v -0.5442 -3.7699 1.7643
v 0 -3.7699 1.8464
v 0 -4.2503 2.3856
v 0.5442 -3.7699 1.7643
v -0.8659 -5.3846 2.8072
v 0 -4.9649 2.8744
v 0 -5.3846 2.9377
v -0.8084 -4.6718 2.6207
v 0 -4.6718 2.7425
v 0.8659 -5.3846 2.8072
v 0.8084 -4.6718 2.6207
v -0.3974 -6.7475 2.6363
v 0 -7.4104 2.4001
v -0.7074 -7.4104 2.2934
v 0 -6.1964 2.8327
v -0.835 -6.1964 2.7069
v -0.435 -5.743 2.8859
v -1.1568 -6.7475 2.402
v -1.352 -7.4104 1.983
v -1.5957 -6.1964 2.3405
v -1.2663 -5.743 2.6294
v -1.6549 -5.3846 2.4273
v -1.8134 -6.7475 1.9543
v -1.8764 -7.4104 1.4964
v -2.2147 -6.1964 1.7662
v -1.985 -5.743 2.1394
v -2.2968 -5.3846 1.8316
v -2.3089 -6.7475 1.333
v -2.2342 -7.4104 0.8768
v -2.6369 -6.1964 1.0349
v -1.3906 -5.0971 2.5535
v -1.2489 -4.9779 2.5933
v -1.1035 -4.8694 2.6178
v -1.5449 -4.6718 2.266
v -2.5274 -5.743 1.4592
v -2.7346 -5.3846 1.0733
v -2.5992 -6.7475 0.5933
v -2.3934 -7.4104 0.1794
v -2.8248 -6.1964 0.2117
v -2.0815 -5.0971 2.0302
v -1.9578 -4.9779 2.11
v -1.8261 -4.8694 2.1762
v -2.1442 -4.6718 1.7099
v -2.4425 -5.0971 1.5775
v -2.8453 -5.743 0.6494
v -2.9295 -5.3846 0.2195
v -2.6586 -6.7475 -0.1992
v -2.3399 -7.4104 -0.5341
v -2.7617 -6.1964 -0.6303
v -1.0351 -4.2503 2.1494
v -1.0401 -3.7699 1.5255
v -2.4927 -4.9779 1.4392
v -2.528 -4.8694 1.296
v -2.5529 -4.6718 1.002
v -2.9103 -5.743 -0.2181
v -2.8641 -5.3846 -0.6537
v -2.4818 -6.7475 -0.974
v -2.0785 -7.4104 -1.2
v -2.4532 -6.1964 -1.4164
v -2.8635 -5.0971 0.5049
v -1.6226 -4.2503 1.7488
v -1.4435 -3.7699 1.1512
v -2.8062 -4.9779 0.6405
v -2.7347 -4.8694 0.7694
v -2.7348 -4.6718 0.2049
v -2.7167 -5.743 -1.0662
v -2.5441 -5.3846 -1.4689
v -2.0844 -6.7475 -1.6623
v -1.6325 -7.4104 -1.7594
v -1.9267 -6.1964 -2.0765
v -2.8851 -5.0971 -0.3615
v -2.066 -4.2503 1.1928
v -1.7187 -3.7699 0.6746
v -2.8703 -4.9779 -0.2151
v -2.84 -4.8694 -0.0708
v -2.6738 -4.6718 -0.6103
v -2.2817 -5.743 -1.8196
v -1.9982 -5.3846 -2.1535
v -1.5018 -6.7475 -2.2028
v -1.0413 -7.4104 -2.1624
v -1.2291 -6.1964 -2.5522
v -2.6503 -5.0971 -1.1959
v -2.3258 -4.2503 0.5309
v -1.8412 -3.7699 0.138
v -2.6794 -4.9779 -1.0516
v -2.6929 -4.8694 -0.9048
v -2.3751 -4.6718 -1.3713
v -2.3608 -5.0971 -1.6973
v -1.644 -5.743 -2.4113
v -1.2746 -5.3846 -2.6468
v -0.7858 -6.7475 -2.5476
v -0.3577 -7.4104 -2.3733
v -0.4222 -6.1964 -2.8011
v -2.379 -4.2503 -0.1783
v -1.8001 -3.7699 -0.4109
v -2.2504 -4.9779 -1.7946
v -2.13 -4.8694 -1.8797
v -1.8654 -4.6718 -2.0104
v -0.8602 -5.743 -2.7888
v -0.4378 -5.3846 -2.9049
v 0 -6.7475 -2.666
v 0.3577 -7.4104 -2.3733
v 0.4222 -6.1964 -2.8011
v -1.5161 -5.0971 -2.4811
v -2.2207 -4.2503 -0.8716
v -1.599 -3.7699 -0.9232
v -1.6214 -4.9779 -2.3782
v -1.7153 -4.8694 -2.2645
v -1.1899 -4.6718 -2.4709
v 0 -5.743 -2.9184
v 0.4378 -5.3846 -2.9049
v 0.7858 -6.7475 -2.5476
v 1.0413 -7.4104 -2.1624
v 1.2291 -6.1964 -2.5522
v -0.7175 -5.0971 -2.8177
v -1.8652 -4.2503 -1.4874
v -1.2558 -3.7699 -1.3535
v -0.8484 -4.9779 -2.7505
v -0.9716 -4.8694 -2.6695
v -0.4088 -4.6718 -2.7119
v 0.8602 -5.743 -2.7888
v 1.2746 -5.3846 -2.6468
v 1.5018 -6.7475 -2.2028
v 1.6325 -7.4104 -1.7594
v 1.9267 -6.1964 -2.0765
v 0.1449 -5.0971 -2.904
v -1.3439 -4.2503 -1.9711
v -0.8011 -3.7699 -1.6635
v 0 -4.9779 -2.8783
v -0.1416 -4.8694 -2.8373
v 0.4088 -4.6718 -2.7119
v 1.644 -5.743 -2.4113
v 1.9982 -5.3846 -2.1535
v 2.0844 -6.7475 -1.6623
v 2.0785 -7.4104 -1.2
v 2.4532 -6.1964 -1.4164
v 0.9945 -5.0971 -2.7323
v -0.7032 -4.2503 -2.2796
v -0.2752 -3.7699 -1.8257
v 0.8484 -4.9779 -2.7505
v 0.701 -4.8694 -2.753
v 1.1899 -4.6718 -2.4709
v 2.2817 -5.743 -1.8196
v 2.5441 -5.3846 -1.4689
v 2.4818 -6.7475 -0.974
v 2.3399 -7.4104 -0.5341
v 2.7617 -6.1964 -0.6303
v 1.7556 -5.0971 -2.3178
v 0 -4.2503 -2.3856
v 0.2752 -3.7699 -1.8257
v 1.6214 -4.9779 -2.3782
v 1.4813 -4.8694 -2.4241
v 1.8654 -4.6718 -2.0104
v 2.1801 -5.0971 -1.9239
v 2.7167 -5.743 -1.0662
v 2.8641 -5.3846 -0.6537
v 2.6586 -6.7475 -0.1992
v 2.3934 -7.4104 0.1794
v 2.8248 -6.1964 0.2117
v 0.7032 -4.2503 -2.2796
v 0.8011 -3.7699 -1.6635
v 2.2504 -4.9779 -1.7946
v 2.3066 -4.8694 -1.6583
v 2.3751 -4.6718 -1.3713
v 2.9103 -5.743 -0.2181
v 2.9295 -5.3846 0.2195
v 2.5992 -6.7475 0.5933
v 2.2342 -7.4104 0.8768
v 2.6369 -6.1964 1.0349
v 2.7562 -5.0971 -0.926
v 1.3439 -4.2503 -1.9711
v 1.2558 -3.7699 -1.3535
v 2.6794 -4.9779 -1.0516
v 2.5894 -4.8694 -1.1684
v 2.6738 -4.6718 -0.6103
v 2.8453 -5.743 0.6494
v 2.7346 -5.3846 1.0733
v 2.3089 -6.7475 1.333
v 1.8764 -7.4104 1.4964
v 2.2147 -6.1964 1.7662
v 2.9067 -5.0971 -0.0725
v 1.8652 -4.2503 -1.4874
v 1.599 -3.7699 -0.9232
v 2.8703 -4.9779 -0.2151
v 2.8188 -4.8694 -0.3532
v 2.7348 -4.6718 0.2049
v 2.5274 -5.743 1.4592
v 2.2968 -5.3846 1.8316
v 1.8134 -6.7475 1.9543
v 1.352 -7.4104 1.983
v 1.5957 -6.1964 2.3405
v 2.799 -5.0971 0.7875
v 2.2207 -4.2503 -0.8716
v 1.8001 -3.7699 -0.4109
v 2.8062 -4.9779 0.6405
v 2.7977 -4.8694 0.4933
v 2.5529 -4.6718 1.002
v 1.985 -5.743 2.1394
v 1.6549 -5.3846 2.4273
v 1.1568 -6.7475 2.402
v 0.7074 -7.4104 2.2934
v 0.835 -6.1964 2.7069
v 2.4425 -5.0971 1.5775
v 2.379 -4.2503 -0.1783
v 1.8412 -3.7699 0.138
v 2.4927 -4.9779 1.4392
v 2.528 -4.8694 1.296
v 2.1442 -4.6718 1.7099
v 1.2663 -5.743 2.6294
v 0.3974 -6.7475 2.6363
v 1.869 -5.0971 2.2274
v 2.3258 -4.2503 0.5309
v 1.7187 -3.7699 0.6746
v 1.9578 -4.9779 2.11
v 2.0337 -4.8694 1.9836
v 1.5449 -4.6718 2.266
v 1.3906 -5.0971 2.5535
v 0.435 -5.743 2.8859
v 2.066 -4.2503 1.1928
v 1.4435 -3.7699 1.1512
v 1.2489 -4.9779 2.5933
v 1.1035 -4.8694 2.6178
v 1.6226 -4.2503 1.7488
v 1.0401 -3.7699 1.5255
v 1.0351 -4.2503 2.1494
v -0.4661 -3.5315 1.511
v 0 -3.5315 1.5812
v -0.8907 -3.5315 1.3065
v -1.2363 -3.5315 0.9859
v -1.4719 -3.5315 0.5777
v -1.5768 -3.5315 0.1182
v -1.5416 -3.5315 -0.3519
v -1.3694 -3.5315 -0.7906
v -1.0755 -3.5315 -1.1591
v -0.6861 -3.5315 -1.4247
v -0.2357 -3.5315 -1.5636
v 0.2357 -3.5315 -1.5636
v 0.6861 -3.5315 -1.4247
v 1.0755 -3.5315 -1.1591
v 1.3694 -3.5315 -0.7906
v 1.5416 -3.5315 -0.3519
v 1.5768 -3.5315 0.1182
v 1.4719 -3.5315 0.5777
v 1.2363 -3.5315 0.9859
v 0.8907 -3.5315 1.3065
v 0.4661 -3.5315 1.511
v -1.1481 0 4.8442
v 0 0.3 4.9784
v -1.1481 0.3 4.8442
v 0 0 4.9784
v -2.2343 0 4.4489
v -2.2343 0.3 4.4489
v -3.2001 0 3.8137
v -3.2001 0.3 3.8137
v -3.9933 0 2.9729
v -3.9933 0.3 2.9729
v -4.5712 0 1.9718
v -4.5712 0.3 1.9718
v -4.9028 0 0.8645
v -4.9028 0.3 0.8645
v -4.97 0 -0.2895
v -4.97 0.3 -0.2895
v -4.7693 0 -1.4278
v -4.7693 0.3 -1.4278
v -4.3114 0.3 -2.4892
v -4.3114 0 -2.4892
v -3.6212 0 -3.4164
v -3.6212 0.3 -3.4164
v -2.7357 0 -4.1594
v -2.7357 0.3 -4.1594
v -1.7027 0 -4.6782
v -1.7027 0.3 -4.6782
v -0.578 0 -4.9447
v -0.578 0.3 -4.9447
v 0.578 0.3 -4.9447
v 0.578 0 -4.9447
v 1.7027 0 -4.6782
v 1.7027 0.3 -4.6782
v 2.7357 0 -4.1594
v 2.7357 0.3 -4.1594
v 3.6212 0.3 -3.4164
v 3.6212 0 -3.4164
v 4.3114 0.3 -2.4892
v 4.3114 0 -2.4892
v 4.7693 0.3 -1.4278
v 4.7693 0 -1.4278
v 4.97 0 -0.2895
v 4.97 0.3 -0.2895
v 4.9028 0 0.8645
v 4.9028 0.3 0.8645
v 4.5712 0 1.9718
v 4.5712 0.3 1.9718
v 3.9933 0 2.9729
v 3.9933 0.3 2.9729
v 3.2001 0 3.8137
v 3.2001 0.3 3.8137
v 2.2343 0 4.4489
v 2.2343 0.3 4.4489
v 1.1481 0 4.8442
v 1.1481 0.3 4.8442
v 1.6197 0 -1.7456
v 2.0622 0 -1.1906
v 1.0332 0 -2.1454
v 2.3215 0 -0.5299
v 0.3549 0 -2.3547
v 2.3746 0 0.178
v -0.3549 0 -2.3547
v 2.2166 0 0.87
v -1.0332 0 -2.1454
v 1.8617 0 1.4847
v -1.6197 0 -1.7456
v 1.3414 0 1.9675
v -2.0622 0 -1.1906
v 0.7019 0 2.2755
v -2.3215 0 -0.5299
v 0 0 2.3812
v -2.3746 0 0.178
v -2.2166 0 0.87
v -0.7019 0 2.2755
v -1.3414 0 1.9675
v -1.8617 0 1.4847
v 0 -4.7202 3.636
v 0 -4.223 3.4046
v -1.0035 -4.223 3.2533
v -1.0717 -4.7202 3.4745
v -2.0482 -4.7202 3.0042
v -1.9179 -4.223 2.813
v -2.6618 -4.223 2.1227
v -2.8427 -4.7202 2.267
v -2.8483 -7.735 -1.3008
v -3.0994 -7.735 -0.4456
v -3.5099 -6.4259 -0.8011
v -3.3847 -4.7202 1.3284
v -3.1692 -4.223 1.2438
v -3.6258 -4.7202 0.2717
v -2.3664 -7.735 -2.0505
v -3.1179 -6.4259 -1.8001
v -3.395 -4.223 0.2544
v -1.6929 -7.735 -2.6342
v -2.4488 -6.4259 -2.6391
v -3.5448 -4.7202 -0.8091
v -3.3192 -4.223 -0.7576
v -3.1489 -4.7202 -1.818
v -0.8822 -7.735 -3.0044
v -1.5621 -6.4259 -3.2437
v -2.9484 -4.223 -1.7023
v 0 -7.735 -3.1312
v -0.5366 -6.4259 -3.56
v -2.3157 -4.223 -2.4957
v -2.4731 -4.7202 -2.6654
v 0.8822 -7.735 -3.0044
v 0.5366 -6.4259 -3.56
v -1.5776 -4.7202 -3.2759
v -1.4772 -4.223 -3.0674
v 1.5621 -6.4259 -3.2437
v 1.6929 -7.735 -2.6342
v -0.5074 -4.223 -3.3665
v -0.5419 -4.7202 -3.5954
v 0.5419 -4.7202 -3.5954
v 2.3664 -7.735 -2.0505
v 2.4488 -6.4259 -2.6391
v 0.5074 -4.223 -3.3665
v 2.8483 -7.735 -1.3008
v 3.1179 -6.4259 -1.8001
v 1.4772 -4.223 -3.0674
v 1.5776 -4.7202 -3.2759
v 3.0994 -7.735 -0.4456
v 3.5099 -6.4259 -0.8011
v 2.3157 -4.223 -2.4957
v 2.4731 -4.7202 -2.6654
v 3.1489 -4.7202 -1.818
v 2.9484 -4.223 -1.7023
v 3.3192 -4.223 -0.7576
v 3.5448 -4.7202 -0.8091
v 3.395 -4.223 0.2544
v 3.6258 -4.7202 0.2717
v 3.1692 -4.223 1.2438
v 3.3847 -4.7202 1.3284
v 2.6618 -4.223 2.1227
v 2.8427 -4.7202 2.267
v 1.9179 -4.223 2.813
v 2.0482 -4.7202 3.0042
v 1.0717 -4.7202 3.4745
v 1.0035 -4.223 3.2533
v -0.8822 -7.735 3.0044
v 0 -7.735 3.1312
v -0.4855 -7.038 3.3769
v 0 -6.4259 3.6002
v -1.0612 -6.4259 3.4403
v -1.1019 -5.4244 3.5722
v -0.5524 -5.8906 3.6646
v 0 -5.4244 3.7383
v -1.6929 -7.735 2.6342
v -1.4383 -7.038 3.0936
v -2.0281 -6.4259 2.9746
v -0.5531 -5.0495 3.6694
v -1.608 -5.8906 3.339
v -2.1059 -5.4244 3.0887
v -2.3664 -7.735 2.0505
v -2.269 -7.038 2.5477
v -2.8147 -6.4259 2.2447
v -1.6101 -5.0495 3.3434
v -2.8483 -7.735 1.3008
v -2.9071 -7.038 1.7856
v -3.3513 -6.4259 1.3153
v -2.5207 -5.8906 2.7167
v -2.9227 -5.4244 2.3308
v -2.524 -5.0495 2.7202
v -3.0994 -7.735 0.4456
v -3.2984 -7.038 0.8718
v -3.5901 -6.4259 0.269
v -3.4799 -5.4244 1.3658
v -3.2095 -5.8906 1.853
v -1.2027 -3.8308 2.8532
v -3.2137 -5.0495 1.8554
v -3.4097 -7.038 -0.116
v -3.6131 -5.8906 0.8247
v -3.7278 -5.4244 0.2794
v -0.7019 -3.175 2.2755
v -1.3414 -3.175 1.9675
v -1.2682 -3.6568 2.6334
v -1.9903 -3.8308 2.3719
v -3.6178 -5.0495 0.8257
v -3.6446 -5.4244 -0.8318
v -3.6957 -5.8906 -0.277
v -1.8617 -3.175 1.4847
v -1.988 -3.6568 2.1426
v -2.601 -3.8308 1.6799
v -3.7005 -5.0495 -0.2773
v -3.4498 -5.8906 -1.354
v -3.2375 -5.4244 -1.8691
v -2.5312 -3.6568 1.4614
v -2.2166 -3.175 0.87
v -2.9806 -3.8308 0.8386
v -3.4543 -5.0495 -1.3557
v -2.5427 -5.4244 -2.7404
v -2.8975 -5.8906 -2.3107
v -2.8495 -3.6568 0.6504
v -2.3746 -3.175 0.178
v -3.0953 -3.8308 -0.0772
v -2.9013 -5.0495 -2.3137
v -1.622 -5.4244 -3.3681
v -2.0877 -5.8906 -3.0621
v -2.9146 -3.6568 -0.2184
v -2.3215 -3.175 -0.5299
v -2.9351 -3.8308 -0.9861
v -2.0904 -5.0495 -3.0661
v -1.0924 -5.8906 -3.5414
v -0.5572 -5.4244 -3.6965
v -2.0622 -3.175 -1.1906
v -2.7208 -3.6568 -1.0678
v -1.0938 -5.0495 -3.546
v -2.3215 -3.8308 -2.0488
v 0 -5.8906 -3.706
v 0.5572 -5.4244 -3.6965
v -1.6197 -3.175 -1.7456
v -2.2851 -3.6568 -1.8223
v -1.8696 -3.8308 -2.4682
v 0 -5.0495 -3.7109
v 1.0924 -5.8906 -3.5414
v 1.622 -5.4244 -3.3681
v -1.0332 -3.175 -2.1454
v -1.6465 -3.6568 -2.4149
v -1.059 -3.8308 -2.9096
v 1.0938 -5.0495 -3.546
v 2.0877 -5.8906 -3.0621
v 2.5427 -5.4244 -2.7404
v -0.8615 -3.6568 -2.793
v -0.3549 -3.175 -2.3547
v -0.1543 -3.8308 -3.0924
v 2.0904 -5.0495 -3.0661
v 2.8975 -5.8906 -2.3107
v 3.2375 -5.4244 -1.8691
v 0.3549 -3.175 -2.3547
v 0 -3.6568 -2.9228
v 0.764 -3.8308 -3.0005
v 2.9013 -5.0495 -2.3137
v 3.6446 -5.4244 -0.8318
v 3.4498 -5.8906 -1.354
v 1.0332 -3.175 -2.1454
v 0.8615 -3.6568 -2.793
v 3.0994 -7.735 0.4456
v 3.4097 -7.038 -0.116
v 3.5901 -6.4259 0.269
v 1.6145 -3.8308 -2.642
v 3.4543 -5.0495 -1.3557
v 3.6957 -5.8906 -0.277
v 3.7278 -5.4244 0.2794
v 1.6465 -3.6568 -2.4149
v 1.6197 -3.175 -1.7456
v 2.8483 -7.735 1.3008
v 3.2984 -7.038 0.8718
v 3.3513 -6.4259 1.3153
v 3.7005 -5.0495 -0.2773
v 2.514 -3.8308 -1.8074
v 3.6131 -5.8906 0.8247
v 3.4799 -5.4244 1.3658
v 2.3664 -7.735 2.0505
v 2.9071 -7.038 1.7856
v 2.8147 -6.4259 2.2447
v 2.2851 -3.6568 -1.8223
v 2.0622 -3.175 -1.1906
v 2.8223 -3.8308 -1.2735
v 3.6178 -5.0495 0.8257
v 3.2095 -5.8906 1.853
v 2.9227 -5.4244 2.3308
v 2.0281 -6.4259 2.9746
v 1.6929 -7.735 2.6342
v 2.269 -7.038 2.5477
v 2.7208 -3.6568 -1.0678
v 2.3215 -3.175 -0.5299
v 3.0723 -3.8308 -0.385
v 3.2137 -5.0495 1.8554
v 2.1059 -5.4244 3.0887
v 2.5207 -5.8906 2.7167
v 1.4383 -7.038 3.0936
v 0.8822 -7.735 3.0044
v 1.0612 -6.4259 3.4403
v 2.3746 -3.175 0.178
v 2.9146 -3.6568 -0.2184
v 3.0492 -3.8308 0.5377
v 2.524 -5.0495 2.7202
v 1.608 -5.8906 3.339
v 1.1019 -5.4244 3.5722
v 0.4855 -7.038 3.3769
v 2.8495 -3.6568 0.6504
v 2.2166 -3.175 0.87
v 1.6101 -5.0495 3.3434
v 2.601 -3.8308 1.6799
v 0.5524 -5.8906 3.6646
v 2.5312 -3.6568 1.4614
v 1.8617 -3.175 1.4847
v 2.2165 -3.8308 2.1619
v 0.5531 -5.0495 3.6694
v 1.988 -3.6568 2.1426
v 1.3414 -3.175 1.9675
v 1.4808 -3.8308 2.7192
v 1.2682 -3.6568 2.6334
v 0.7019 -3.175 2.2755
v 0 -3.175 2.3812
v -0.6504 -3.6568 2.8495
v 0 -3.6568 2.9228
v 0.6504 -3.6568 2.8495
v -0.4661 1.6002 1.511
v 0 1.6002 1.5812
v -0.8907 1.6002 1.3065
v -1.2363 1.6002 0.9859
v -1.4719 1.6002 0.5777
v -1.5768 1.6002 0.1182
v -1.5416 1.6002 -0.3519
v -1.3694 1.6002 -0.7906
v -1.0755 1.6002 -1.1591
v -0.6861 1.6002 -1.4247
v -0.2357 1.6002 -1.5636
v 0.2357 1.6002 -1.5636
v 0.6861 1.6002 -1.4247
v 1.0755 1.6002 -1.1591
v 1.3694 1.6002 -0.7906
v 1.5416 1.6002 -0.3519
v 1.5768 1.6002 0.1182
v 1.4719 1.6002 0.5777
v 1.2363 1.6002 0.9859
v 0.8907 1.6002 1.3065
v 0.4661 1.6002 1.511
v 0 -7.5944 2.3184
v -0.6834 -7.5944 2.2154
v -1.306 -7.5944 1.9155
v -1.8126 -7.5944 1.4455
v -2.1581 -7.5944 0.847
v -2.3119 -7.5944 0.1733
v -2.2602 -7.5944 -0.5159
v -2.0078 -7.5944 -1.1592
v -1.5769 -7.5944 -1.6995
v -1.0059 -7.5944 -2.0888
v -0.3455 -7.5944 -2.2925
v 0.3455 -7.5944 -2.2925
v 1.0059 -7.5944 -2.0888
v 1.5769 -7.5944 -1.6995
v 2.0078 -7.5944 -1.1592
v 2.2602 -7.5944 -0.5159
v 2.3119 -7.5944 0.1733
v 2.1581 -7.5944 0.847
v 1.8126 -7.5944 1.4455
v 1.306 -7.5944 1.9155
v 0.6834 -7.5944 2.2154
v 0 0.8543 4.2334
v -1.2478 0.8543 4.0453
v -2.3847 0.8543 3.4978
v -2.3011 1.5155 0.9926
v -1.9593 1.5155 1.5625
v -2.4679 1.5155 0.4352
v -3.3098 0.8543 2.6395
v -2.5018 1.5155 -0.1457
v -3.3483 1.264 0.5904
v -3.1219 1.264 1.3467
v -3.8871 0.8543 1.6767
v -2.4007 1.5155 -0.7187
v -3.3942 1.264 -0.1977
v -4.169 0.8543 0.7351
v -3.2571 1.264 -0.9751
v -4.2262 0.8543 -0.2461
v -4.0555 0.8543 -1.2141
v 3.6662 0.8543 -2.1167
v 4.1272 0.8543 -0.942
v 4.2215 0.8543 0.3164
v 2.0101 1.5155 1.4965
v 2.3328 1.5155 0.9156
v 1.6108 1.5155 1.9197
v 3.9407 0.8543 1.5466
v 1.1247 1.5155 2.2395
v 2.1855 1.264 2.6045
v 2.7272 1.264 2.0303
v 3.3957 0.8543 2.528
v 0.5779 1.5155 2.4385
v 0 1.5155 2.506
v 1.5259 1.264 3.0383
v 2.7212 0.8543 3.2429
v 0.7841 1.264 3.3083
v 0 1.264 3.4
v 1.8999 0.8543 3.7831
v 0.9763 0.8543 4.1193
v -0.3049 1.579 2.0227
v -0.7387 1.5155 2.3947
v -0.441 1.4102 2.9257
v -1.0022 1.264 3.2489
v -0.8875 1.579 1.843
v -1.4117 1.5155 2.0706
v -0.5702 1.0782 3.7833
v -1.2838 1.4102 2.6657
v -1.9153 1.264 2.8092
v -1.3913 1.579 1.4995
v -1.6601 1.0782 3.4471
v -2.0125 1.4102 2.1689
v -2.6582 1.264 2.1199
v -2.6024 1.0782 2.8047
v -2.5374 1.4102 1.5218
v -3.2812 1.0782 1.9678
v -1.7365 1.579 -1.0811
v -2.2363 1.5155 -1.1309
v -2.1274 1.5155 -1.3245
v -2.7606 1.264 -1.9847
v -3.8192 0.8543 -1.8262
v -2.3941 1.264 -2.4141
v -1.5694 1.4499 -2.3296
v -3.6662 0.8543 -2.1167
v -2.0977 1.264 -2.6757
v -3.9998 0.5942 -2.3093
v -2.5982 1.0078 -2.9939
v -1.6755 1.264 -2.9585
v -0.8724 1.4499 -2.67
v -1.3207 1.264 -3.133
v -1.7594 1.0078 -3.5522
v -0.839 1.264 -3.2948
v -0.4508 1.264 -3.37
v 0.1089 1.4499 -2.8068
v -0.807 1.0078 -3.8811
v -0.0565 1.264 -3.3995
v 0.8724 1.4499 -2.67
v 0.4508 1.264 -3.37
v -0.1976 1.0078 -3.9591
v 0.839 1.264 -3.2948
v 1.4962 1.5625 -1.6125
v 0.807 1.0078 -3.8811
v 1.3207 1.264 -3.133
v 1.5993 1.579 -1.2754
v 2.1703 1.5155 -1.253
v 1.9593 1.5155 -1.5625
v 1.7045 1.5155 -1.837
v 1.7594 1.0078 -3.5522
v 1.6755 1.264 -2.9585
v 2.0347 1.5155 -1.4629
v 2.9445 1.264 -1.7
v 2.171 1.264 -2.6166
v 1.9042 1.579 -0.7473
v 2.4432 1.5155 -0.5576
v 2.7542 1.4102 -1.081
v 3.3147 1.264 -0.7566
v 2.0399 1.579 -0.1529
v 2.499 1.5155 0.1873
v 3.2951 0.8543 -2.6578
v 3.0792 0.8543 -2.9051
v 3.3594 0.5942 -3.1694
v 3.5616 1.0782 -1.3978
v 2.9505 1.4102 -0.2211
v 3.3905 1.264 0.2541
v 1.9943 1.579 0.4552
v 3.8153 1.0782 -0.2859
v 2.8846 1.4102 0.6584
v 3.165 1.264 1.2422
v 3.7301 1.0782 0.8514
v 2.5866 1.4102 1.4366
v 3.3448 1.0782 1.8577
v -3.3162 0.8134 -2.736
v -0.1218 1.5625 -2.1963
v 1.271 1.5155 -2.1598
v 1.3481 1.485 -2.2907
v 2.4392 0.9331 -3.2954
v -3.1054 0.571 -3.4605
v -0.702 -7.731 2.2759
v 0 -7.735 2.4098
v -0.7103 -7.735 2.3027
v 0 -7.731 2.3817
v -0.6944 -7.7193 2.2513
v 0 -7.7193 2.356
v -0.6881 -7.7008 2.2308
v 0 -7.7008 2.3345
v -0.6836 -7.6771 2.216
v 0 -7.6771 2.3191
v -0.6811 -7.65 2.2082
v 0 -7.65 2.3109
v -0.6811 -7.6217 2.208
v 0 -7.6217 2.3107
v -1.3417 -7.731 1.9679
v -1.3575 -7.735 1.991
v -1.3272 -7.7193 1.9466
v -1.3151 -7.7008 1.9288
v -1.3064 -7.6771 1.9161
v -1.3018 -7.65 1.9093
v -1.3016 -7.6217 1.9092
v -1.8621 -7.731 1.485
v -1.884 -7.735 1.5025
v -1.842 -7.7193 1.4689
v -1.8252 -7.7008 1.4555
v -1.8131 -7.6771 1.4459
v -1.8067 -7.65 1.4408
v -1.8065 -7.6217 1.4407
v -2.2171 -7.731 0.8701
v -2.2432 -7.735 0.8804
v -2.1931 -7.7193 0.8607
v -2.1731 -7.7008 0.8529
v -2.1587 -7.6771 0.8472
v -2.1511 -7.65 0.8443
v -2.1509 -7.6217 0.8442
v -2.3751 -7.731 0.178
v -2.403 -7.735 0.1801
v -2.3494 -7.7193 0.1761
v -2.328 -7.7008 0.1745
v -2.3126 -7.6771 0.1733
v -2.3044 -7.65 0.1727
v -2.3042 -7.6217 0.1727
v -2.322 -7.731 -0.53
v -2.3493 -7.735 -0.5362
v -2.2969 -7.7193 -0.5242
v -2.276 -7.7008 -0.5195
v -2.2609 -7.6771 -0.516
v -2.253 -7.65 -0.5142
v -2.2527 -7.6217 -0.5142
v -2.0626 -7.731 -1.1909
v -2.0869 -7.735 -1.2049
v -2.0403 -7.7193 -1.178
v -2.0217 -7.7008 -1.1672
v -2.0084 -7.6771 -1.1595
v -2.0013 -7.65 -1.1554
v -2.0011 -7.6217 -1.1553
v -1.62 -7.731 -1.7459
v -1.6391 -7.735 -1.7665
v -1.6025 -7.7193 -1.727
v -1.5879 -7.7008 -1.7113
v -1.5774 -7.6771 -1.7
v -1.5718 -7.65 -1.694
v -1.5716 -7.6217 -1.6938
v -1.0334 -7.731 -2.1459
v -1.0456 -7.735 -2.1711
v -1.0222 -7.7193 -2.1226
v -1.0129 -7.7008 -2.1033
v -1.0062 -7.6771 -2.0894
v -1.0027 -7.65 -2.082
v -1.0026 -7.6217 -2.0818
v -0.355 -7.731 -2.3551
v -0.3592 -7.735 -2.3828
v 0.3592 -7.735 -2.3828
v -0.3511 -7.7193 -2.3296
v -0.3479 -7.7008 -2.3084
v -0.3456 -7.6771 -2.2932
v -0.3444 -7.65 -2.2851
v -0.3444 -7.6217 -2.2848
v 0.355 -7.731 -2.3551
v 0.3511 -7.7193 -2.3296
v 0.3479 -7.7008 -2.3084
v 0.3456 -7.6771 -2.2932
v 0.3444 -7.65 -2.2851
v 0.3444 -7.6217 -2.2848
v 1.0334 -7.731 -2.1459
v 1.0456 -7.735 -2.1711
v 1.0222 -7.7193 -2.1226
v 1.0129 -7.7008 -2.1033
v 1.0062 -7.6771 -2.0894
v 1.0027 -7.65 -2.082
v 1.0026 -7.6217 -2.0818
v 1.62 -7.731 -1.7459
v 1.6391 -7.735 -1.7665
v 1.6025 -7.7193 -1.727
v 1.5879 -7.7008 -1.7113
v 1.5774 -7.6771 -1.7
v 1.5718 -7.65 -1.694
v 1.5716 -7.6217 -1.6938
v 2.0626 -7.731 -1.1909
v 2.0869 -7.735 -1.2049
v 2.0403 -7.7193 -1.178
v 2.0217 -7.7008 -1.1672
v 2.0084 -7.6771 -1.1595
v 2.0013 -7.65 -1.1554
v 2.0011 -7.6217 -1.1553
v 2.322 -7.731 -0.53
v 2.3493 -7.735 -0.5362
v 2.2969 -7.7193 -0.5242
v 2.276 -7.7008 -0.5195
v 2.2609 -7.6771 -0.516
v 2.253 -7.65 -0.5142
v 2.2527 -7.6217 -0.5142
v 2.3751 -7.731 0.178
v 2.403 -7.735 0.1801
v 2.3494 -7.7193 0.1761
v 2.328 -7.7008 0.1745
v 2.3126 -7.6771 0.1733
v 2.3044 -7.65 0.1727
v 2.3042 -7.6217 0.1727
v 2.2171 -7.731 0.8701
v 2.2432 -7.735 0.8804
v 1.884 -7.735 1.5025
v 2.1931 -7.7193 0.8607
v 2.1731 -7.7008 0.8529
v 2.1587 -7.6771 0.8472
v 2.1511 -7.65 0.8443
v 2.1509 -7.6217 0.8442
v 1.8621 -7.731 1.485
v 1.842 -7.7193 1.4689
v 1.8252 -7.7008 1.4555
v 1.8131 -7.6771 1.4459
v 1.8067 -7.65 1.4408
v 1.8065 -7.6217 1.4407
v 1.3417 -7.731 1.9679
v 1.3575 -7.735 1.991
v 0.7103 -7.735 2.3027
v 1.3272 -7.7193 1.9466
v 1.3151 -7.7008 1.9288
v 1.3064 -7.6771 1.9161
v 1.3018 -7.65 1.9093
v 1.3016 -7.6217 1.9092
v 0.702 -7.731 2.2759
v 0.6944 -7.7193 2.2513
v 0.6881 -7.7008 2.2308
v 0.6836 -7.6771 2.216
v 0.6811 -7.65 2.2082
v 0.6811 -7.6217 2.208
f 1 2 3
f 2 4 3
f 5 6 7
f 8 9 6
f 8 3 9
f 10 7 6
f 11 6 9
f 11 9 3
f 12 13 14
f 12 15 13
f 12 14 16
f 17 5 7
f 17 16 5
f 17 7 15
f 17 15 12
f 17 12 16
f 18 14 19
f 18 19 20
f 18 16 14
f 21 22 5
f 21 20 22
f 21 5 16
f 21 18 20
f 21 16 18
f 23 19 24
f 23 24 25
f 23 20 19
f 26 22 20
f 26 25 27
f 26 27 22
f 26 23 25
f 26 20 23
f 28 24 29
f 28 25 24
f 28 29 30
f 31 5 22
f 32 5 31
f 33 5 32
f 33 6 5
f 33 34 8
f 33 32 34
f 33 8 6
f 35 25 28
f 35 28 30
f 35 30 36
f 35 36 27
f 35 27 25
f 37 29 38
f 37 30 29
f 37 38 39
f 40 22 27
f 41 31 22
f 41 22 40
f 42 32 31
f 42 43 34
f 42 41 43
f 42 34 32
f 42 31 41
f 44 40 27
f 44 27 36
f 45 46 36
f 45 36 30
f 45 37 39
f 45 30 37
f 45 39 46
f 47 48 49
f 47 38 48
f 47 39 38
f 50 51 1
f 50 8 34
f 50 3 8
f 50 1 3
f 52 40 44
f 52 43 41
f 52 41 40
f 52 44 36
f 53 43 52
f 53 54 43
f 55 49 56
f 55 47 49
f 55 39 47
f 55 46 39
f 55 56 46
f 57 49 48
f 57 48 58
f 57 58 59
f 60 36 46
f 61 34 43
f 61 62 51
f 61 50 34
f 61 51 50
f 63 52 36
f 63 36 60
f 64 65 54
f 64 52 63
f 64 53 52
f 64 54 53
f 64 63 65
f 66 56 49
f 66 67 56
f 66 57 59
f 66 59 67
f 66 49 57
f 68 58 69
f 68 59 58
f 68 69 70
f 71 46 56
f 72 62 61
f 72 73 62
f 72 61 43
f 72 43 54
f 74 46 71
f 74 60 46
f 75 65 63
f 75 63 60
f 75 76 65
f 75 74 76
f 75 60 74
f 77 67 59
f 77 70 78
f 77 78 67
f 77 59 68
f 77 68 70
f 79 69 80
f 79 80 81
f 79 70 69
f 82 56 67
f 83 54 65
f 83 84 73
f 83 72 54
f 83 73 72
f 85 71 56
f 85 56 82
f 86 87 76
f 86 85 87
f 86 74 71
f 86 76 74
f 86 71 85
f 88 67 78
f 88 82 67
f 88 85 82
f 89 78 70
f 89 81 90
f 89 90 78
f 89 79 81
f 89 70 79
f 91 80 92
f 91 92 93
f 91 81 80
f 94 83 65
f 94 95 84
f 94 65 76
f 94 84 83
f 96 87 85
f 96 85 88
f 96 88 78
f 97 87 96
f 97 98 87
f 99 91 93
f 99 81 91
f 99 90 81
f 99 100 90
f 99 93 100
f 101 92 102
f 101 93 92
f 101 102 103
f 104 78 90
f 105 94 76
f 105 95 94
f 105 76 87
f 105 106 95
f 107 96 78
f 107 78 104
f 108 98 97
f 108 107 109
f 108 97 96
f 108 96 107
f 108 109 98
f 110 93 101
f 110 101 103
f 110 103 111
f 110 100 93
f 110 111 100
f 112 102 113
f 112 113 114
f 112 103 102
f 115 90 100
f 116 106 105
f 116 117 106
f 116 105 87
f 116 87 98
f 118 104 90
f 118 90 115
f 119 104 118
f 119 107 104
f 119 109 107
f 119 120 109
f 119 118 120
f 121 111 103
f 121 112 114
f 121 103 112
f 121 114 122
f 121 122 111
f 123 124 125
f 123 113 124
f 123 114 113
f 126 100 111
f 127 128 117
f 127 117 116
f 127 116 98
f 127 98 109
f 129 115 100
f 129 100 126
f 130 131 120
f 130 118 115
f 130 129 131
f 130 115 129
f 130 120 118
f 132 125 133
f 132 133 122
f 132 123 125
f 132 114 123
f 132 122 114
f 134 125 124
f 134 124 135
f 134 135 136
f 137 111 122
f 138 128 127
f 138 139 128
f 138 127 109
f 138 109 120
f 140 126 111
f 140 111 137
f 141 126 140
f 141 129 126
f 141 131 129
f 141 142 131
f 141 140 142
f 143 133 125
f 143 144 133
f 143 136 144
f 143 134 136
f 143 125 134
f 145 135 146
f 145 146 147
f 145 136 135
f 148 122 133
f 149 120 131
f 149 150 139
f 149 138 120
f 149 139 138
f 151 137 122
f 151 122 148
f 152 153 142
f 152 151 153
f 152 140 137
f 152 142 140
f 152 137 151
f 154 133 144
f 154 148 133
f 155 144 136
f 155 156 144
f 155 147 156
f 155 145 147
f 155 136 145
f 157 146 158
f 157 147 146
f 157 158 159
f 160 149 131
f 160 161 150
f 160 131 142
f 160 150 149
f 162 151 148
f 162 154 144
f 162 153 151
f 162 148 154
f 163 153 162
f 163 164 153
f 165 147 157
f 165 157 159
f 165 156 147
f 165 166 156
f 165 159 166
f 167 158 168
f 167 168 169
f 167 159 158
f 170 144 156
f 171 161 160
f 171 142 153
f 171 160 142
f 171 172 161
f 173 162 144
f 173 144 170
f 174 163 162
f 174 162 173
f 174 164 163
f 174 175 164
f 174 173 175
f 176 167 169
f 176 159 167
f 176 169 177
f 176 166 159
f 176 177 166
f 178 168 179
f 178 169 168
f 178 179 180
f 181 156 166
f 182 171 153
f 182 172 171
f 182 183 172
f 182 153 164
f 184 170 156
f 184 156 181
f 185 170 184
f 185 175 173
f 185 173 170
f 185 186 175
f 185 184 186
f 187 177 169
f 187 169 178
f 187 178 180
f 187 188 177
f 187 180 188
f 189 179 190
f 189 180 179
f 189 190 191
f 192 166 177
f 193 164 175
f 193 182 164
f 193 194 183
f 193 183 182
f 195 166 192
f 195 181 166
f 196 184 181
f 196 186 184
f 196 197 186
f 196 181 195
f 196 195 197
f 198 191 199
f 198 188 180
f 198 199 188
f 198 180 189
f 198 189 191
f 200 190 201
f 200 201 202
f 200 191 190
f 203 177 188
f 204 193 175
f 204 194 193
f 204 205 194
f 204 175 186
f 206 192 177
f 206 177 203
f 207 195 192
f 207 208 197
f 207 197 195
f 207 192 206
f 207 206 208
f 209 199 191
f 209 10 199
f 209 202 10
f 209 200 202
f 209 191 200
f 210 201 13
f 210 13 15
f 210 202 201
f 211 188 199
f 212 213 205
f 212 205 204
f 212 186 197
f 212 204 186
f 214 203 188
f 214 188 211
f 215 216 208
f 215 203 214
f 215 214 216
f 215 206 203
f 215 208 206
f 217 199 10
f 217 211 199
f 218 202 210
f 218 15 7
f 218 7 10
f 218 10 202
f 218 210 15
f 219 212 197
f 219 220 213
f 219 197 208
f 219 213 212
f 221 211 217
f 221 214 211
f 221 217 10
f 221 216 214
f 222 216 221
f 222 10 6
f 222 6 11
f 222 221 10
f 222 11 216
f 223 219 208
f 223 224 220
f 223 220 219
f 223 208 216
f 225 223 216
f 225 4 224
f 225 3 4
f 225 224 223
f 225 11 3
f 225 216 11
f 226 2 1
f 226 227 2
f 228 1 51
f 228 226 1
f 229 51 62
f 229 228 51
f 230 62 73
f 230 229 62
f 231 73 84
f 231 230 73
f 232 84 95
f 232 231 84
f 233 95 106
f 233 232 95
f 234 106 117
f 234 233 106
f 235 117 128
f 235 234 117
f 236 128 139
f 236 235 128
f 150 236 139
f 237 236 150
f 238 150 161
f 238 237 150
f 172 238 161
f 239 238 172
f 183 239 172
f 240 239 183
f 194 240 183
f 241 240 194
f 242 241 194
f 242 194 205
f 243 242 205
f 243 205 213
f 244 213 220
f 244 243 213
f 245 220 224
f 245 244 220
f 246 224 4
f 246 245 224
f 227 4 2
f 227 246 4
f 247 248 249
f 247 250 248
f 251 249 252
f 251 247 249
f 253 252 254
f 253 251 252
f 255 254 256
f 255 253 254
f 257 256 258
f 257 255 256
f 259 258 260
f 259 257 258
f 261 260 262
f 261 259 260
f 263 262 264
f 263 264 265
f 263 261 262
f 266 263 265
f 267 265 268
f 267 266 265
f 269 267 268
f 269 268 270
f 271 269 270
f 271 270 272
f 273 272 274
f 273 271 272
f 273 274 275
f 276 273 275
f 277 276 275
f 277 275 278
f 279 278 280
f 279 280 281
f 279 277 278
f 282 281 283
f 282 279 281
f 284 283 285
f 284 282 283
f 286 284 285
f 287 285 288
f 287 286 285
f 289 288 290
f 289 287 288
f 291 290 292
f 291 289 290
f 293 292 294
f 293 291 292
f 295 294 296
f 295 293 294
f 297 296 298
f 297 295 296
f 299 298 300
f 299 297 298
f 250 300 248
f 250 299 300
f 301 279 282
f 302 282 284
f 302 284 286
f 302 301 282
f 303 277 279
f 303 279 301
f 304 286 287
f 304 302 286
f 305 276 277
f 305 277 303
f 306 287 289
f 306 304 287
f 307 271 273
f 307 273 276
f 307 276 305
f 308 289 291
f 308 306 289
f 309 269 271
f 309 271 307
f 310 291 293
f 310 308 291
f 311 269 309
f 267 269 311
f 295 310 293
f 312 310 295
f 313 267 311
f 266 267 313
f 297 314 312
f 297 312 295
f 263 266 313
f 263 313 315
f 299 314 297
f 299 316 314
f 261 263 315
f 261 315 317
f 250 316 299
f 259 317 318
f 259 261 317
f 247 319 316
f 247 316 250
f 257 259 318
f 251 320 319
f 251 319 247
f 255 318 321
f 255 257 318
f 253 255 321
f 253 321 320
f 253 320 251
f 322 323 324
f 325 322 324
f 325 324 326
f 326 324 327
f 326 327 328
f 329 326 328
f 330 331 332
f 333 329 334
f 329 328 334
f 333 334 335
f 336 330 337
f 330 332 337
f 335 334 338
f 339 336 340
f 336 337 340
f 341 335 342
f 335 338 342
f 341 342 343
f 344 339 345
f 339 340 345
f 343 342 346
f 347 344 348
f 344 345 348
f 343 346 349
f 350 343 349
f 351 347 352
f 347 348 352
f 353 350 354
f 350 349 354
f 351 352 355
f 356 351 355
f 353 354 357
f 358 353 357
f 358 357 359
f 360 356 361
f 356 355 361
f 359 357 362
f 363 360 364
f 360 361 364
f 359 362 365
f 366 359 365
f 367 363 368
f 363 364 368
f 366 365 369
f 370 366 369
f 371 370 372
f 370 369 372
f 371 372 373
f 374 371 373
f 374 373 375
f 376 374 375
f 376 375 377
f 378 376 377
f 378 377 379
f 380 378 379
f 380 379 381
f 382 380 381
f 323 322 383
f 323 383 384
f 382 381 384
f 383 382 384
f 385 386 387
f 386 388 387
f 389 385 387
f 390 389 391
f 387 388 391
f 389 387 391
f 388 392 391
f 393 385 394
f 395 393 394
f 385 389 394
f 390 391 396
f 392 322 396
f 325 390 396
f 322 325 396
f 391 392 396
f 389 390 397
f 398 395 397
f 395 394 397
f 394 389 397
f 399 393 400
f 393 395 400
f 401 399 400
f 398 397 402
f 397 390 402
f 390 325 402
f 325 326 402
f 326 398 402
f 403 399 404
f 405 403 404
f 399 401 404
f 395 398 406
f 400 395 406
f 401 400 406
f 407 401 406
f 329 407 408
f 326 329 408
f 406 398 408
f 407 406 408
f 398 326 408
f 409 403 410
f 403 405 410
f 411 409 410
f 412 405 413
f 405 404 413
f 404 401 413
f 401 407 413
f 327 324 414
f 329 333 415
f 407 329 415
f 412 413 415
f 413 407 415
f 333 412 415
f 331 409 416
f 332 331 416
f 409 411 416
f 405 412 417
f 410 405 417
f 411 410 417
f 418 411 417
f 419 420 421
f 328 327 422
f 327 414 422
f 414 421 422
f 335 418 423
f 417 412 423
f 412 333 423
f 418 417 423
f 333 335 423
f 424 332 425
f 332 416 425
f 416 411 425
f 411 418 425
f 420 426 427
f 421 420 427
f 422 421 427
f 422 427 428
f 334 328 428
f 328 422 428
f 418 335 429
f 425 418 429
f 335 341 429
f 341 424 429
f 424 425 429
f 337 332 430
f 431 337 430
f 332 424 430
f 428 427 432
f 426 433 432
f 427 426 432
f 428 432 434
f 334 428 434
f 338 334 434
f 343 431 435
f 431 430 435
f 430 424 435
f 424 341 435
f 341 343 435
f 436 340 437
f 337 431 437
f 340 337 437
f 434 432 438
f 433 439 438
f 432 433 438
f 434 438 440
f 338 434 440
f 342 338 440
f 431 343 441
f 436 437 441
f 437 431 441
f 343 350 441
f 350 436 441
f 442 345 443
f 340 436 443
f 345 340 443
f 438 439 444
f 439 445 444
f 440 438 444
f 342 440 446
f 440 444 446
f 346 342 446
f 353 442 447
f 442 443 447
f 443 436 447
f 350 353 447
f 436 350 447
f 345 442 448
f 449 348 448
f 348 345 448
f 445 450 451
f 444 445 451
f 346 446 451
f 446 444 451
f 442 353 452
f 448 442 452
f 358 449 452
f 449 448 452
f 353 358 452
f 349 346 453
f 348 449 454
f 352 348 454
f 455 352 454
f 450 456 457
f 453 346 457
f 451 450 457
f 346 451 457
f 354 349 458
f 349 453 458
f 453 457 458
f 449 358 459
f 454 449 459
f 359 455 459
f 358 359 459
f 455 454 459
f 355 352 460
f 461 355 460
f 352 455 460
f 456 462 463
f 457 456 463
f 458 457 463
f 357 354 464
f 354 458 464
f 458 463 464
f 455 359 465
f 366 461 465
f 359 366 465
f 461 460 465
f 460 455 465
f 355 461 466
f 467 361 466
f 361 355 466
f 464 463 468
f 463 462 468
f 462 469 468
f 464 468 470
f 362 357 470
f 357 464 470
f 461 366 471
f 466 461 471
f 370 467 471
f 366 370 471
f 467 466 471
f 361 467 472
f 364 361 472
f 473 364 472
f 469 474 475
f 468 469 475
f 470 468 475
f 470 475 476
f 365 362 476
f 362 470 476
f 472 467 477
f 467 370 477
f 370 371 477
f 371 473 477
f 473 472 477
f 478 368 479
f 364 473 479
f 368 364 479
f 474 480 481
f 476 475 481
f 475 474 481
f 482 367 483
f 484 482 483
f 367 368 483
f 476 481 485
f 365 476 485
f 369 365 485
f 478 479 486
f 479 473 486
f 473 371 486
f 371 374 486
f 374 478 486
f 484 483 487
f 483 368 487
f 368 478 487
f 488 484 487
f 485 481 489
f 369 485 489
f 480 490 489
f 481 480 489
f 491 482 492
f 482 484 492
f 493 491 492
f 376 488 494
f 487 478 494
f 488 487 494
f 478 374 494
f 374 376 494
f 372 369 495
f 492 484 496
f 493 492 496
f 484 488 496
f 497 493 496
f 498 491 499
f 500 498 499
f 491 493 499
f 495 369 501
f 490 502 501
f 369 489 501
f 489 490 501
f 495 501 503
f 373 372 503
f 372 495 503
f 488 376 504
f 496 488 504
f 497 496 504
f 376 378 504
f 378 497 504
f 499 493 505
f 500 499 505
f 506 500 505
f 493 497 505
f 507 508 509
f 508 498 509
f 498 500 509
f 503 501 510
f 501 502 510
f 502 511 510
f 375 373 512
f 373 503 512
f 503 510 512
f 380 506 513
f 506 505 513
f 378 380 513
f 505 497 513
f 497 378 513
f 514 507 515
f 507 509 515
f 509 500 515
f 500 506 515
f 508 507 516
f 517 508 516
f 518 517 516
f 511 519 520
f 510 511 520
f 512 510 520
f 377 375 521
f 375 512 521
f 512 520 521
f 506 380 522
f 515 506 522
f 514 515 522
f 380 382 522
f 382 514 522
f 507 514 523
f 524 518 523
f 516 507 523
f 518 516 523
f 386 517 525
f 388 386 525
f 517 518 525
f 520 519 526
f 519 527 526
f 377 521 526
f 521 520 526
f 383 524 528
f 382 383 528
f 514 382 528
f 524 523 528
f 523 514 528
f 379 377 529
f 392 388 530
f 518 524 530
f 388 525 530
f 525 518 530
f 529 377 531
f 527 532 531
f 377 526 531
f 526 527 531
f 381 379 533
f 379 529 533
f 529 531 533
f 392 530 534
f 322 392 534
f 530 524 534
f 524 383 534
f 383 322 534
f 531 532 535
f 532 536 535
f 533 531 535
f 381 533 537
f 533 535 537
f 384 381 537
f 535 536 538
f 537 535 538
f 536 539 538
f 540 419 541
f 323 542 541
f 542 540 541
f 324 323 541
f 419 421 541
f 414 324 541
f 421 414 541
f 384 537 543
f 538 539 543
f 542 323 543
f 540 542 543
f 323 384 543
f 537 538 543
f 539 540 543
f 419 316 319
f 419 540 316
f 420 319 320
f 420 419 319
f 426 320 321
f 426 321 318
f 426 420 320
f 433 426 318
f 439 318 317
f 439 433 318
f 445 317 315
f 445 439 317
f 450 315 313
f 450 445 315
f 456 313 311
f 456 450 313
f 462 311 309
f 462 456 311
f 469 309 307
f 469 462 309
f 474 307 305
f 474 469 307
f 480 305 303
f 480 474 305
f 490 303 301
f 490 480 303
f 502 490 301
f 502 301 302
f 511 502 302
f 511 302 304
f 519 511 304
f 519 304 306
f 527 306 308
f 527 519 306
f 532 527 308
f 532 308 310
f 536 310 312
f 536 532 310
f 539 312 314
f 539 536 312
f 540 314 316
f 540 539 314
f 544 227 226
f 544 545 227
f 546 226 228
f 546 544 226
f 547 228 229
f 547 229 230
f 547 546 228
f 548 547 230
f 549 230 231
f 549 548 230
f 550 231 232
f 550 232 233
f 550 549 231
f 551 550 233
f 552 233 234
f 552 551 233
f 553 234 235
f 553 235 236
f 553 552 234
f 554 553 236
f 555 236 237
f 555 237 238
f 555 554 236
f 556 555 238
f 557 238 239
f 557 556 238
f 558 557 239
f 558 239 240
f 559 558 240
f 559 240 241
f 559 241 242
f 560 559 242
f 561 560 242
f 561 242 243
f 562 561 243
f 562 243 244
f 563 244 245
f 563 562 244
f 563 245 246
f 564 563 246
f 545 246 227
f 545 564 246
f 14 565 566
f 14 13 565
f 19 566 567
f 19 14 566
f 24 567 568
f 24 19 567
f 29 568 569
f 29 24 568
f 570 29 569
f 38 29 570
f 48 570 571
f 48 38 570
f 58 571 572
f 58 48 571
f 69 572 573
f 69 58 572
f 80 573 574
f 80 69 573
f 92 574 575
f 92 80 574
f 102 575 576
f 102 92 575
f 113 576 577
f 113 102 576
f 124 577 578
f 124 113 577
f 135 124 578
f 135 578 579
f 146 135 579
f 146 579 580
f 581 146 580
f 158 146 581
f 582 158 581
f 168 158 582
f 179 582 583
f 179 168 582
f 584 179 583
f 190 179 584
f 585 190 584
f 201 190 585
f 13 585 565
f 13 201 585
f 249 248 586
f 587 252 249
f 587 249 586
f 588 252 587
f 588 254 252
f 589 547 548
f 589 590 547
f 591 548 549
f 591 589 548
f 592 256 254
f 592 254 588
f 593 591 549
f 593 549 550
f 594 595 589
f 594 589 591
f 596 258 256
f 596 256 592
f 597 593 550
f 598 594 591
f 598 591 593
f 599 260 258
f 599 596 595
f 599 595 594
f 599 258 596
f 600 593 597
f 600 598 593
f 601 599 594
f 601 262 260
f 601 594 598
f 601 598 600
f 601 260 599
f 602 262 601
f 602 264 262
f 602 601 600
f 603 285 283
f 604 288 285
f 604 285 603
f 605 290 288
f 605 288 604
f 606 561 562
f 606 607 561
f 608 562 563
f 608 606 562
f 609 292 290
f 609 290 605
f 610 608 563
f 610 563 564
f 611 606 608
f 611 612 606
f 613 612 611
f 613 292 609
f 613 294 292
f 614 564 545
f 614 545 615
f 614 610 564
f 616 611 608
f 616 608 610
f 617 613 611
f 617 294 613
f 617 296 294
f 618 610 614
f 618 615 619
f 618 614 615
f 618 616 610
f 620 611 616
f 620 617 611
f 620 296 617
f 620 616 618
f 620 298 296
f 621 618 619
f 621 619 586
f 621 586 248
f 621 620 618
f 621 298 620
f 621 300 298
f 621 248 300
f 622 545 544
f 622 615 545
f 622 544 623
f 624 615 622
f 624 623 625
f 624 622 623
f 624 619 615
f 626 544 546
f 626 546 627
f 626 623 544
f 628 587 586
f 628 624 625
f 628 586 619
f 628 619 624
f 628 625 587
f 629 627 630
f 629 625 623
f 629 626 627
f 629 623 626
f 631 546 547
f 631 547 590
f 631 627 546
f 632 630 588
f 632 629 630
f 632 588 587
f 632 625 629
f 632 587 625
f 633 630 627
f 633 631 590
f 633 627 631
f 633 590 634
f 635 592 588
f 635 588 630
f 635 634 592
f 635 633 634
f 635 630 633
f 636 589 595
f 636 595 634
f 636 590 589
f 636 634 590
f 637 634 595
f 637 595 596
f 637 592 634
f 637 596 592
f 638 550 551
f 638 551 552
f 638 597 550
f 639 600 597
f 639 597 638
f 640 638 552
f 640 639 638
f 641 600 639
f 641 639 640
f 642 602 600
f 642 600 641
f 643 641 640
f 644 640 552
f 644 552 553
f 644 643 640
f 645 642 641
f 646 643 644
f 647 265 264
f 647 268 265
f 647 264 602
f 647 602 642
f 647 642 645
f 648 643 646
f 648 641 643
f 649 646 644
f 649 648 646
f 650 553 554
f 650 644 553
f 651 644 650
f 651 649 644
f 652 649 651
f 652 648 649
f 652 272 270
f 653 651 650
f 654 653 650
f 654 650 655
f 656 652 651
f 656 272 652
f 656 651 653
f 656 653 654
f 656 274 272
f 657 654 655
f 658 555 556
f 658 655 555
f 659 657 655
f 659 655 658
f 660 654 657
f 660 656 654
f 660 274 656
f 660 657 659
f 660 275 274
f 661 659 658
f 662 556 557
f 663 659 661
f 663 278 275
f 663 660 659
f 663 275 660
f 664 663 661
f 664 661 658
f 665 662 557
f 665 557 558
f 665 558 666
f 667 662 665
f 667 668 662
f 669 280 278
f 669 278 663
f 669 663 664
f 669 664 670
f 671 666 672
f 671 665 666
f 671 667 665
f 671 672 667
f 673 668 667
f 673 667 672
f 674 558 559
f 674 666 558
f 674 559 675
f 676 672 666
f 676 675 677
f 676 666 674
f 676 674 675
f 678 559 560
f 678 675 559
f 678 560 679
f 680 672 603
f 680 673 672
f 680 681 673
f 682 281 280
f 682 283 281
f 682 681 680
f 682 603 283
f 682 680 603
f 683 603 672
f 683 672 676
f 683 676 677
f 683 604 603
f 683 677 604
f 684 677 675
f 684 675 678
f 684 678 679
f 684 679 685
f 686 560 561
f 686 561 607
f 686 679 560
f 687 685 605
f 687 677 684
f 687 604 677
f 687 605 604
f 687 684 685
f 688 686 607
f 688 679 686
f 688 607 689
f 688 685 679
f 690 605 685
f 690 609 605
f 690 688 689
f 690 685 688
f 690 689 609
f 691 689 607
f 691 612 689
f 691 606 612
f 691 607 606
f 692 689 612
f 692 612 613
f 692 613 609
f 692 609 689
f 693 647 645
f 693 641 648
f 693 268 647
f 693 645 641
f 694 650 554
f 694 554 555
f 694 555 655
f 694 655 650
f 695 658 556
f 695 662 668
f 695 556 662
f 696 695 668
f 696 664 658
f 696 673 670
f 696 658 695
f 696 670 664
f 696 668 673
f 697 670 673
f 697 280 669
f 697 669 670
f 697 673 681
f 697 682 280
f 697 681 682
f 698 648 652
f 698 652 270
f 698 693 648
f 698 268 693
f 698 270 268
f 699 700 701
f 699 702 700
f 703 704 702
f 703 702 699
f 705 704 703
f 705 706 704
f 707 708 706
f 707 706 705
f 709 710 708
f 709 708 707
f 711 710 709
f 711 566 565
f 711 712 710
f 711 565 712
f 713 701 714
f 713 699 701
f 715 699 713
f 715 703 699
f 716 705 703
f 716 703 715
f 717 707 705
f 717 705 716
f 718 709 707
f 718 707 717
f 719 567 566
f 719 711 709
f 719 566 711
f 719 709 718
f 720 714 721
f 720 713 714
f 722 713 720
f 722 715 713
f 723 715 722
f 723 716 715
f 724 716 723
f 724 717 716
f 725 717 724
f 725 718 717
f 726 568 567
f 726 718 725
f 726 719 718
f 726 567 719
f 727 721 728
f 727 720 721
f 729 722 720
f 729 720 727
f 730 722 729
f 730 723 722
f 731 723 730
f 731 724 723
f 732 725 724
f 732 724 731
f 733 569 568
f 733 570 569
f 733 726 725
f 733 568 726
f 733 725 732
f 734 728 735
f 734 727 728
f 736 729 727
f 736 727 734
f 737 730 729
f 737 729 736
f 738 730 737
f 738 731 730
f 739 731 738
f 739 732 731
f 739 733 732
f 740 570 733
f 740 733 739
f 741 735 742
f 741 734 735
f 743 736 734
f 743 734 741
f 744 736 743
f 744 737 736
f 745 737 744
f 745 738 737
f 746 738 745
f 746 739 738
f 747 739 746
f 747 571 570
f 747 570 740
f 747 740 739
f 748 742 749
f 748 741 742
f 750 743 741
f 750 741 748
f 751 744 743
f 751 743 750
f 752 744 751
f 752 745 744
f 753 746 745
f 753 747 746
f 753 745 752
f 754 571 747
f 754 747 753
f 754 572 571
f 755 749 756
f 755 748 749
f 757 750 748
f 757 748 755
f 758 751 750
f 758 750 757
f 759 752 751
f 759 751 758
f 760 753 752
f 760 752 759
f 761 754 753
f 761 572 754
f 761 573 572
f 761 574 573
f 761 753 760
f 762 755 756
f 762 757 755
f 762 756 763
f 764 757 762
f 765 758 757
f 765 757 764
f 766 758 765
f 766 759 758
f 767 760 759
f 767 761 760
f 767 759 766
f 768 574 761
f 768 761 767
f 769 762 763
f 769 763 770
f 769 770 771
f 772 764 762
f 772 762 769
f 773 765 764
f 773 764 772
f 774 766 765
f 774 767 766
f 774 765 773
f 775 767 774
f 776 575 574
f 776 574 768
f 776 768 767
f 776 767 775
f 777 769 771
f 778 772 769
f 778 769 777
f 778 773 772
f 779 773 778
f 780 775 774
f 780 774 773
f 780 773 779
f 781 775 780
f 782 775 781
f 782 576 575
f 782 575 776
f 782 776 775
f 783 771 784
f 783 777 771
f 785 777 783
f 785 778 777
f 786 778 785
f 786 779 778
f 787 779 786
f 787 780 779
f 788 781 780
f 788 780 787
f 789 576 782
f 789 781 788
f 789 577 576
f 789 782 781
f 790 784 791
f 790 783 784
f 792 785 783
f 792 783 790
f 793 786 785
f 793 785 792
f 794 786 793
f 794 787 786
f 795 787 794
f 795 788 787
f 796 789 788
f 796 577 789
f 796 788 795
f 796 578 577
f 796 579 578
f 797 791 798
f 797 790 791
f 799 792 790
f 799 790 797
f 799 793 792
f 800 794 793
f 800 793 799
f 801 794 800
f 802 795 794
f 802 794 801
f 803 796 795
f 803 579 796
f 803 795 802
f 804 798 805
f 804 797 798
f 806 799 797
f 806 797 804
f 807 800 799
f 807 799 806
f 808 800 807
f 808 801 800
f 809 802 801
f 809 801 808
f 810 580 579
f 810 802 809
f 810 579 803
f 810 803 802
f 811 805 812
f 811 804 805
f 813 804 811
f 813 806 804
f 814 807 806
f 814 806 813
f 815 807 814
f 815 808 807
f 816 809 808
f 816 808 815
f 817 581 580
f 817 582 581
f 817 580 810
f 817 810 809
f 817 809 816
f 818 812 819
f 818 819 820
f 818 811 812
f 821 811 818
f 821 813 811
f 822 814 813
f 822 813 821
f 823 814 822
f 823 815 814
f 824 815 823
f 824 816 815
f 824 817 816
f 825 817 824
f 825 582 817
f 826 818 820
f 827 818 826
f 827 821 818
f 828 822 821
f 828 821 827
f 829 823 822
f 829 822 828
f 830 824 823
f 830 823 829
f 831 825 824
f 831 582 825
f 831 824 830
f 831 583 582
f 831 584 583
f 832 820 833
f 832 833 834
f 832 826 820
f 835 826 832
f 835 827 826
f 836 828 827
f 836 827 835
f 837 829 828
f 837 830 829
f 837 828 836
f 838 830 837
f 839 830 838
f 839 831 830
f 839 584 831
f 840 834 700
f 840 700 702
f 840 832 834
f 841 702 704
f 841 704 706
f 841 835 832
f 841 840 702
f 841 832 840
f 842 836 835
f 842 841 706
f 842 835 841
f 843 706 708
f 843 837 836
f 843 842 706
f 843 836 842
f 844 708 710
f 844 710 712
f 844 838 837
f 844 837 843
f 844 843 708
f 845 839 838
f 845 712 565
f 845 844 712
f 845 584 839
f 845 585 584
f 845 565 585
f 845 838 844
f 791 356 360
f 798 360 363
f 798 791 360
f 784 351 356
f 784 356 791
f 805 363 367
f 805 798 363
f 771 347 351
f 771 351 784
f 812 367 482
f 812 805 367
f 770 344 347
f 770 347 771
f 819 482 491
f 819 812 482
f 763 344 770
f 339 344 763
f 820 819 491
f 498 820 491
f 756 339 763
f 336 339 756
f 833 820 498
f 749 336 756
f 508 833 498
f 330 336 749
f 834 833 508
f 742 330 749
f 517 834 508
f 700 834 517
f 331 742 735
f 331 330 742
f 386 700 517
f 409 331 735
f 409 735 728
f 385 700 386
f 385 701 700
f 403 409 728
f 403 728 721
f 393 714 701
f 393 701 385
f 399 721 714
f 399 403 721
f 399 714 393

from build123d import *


with BuildPart() as part:
    # Sketch1 → Revolve1 (revolve)
    with BuildSketch(Plane(origin=(0, 0, 0), x_dir=(0, 0, -1), z_dir=(1, 0, 0))):
        with BuildLine():
            Line((-2.38125, 0), (-2.38125, -3.175))
            add(Edge.make_bspline(
                [(-3.13125, -7.735), (-4.481572132, -4.69339441), (-3.285209116, -3.987769359), (-2.38125, -3.175)],
                knots=[0, 0, 0, 0, 0.915818095, 0.915818095, 0.915818095, 0.915818095], degree=3))
            Line((-3.13125, -7.735), (-2.40976315, -7.735))
            ThreePointArc((-2.40976315, -7.735), (-2.325925169, -7.689508651), (-2.318365246, -7.59442386))
            Line((-2.318365246, -7.59442386), (-2.400066766, -7.410390883))
            add(Edge.make_bspline(
                [(-2.400066766, -7.410390883), (-2.473481138, -7.24502474), (-2.618671482, -6.893141661), (-2.815459664, -6.312909566), (-2.942253182, -5.717677034), (-2.94337461, -5.221055296), (-2.834112517, -4.774968107), (-2.602438756, -4.449638795), (-2.212365795, -4.086777888), (-1.962545412, -3.874353641), (-1.846366913, -3.769895018)],
                knots=[0, 0, 0, 0, 0.057238631, 0.114477262, 0.228954524, 0.343431786, 0.457909047, 0.686863571, 0.801340833, 0.915818095, 0.915818095, 0.915818095, 0.915818095], degree=3))
            Line((-1.846366913, -3.769895018), (-1.58125, -3.531522619))
            Line((-1.58125, -3.531522619), (-1.58125, 1.6002))
            ThreePointArc((-1.58125, 1.6002), (-3.399982262, 1.264045733), (-4.9784, 0.3))
            Line((-4.9784, 0.3), (-4.9784, 0))
            Line((-4.9784, 0), (-2.38125, 0))
        make_face()
    revolve(axis=Axis((0, 0, 0), (0, -1, 0)))


solid = part.part
